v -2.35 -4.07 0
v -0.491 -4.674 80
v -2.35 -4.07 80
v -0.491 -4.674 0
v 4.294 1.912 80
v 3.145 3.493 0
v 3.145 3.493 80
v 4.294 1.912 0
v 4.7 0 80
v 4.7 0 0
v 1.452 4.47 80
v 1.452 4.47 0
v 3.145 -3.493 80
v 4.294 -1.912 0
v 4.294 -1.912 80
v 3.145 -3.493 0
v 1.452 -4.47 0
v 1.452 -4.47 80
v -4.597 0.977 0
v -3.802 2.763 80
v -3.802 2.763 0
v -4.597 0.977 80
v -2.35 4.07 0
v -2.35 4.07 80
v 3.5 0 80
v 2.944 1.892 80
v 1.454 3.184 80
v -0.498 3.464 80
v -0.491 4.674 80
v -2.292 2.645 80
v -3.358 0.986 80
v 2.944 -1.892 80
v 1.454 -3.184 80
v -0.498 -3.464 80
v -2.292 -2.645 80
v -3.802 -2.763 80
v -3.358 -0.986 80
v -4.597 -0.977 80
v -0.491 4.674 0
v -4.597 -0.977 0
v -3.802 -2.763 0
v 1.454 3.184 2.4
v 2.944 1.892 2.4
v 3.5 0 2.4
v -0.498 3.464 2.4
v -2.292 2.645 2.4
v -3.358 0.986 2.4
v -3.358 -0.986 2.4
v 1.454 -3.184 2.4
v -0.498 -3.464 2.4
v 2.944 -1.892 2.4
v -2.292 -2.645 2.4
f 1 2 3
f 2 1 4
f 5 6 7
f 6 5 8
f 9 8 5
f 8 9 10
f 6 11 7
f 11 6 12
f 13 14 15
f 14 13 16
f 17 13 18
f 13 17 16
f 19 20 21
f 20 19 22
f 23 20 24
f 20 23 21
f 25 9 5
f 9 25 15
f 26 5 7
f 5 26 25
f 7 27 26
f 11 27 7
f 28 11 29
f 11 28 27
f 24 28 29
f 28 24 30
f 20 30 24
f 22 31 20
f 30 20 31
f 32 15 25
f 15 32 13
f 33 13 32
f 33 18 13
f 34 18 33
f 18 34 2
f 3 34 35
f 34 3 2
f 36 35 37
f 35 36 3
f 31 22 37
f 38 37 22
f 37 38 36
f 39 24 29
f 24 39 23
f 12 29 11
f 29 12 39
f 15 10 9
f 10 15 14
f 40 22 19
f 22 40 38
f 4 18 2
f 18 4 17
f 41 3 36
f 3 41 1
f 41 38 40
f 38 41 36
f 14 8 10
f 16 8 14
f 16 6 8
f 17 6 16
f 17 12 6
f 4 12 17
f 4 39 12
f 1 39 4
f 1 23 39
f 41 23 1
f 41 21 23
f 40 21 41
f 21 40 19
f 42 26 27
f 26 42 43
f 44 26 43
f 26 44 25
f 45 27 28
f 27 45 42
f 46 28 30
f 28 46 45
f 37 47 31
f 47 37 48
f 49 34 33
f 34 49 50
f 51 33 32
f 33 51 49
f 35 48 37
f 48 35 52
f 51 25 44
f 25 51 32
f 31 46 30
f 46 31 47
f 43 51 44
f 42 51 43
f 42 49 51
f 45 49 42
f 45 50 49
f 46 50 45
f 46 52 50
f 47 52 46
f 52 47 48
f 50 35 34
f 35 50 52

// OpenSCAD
module cover( length, diameter,thickness )
{
    difference() {
        cylinder(d=diameter+thickness,h=length);
        translate( [0,0,thickness] ) cylinder(d=diameter,h=length);
    }
}

cover(80,7,2.4);
